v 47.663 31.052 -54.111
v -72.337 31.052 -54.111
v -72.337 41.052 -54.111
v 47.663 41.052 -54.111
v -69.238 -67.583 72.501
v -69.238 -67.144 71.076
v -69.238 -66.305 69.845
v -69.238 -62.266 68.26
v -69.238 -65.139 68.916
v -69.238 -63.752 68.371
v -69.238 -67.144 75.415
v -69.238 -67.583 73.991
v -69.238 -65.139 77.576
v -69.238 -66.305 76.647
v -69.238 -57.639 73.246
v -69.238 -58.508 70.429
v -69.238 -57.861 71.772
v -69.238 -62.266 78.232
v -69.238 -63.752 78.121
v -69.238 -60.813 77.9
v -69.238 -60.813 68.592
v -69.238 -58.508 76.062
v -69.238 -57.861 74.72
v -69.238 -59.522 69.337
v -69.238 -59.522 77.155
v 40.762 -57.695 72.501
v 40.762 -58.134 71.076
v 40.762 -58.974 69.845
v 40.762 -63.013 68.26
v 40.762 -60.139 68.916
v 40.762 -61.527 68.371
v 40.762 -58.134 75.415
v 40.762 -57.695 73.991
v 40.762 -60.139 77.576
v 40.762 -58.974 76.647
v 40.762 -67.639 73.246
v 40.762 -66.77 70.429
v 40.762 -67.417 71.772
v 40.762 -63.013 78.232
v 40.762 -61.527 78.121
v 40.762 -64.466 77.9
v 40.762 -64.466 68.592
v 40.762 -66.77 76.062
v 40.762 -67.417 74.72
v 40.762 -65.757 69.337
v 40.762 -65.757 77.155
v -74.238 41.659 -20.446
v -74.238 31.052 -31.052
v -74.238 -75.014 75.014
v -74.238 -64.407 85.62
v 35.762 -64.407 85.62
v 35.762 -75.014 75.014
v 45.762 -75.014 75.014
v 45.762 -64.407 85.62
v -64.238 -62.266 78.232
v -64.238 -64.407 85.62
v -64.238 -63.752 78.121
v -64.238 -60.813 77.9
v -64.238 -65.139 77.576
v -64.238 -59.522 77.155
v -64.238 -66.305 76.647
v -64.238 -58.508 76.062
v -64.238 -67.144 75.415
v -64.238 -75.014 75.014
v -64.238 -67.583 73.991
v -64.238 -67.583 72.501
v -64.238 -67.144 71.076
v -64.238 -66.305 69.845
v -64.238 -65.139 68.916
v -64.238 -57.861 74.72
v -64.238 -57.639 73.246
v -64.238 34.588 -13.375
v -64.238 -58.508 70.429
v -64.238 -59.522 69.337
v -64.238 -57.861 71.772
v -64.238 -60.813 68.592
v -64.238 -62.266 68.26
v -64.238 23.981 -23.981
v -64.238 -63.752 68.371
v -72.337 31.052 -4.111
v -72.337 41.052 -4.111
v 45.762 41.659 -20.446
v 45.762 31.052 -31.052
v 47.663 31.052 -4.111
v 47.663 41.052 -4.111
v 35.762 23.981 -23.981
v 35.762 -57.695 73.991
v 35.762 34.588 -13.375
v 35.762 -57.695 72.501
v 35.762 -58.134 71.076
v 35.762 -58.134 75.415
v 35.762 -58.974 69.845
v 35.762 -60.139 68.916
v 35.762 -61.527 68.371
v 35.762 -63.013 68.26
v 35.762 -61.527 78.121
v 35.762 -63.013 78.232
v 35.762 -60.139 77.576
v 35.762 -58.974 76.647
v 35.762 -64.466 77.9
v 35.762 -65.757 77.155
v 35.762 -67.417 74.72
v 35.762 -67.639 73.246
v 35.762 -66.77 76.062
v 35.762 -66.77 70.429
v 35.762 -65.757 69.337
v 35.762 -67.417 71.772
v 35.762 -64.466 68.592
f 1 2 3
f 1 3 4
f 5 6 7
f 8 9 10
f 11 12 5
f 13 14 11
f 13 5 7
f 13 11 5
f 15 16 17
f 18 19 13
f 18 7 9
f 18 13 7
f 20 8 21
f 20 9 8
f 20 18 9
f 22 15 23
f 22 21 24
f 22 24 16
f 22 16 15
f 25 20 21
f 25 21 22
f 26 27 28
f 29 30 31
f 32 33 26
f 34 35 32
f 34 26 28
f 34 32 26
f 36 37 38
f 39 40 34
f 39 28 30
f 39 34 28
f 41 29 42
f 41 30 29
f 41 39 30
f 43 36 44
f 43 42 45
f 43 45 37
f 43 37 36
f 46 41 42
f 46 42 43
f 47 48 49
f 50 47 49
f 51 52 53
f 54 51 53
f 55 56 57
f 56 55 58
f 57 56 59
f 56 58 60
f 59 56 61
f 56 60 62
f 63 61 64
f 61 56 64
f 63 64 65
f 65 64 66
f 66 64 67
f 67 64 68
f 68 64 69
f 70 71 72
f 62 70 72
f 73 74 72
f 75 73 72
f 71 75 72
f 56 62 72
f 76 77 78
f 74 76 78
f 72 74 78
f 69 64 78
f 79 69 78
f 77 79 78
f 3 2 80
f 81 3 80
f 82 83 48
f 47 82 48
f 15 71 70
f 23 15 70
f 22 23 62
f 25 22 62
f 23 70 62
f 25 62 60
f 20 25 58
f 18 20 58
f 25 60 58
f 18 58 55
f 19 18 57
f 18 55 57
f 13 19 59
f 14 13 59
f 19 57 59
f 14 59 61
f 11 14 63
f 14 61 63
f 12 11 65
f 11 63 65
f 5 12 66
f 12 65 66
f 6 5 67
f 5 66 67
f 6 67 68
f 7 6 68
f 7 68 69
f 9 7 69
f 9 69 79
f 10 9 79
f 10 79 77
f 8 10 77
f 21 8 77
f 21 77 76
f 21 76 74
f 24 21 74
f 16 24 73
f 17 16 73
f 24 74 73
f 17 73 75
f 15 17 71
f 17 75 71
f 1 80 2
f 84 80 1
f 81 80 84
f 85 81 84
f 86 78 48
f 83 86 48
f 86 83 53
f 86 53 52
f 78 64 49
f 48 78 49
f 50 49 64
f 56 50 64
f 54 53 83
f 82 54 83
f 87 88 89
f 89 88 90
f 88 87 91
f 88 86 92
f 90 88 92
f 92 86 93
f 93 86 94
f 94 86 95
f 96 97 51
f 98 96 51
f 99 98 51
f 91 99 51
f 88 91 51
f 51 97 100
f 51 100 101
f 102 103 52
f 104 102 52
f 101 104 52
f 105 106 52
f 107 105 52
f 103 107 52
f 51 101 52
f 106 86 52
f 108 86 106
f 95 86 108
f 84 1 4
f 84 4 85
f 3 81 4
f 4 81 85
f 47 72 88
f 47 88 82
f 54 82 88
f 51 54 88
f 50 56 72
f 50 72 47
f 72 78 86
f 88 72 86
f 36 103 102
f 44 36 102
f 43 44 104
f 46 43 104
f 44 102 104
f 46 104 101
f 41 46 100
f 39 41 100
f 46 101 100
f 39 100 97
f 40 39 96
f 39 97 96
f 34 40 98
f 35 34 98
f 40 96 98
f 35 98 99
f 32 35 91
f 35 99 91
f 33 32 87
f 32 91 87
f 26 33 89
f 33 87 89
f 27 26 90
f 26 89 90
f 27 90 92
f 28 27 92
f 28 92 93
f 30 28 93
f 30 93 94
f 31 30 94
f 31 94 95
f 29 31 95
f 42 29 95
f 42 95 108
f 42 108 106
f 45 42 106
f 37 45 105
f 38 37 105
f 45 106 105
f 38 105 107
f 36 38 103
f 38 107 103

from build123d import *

# Parameters (mm, degrees)
F3_DEPTH  = 15
F4_R      = 5
F5_R      = 5
F6_DEPTH  = 5
F7_DEPTH  = 5
F9_W      = 120
F9_H      = 50
F10_DEPTH = 10


with BuildPart() as f3:
    # F2 (on face) → F3 (new body)
    with BuildSketch(Plane(origin=(0, 0, 0), x_dir=(-1, 0, 0), z_dir=(0, 0.707107, 0.707107))):
        Polygon((-35.762306, -33.914671), (-35.762306, 101.085328), (-35.762306, 106.085329), (-45.762306, 106.085329), (-45.762306, -43.914671), (74.237694, -43.914671), (74.237694, 106.085329), (64.237694, 106.085329), (64.237694, 101.085328), (64.237694, -33.914671), align=None)
    extrude(amount=F3_DEPTH)

    # F4 (on face) + F5 (on face) → F6 (cut)
    with BuildSketch(Plane.YZ.offset(-64.237694)):
        with Locations((-62.639289, 73.245887)):
            Circle(F4_R)
    with BuildSketch(Plane(origin=(35.762306, 0, 0), x_dir=(0, -1, 0), z_dir=(-1, 0, 0))):
        with Locations((62.639287, 73.245889)):
            Circle(F5_R)
    extrude(amount=-F6_DEPTH, mode=Mode.SUBTRACT)

    # F5 (on face) → F7 (cut)
    with BuildSketch(Plane(origin=(35.762306, 0, 0), x_dir=(0, -1, 0), z_dir=(-1, 0, 0))):
        with Locations((62.639287, 73.245889)):
            Circle(F5_R)
    extrude(amount=-F7_DEPTH, mode=Mode.SUBTRACT)


with BuildPart() as f10:
    # F9 (on face) → F10 (new body)
    with BuildSketch(Plane.XZ.offset(-31.052361)):
        with Locations((-12.33696, -29.111071)):
            Rectangle(F9_W, F9_H)
    extrude(amount=-F10_DEPTH)


solid = Compound([f3.part, f10.part])
